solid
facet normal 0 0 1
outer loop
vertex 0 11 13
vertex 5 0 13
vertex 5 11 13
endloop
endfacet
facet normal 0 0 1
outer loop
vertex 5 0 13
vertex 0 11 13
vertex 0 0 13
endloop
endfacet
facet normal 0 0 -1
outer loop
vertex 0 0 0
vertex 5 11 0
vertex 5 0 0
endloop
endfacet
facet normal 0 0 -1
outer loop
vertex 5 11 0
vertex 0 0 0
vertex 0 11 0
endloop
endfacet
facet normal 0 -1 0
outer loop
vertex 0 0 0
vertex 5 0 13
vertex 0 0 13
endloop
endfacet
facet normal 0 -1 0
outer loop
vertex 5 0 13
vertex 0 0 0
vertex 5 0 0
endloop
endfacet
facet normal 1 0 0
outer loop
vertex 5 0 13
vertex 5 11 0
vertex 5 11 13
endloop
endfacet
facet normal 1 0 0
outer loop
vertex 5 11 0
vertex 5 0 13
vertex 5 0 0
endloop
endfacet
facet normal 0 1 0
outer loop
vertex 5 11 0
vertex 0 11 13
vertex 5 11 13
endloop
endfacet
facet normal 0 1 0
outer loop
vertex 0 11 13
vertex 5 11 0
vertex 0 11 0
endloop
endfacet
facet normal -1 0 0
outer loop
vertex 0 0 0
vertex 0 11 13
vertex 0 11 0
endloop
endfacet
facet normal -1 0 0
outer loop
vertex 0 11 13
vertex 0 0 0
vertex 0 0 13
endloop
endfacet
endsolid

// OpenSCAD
// Generated by SolidPython 1.0.1 on 2020-07-29 00:46:54


cube(size = [5, 11, 13]);
/***********************************************
*********      SolidPython code:      **********
************************************************
 
# import packages: SolidPython
from solid import *
from solid.utils import *
from itertools import chain, combinations, permutations


class Resize:

    def __init__(self, scad_file):
        self.scad_file = scad_file
        #self.scad_file = import_scad(scad_file)
        # cone/cylinder param:
        self.r1 = 0
        self.r2 = 0
        self.h = 0
        # rectangular prism param:
        self.w = 0
        self.l = 0
        # ellipse param:
        self.r = 0

    # import OpenScad code (file name corresponds to shape)


    # classify shape + parameters
    def assign(self, param1, param2, param3):
        if self.scad_file == 'cone.scad':
            self.r1 = param1
            self.r2 = param2
            self.h = param3
        elif self.scad_file == 'cylinder.scad':
            self.r1 = param1
            self.r2 = param2
            self.h = param3
        elif self.scad_file == 'rectangularPrism.scad':
            self.h = param1
            self.l = param2
            self.w = param3
        else:
            self.r = param1
            self.h = param2

    # resize parameters
    def iterate(self):
        x = range(3, 20, 2)
        i = 1
        if self.scad_file == 'cone.scad':
            tempList = list(permutations(x, 2))
            for temp in tempList:
                param1 = temp[0]
                param2 = temp[1]
                filepath = 'produced_scad_files/' + 'cone' + str(param1) + '_' + str(param2) + '_' + '.scad'
                scad_render_to_file(cylinder(h=param1, r1=param2, r2=0), filepath)

        elif self.scad_file == 'cylinder.scad':
            tempList = list(permutations(x, 3))
            for temp in tempList:
                param1 = temp[0]
                param2 = temp[1]
                filepath = 'produced_scad_files/' + 'cylinder' + str(param1) + '_' + str(param2) + '_' + '.scad'
                scad_render_to_file(cylinder(h=param1, r1=param2, r2=param2), filepath)

        elif self.scad_file == 'rectangularPrism.scad':
            tempList = list(permutations(x, 3))
            for temp in tempList:
                param1 = temp[0]
                param2 = temp[1]
                param3 = temp[2]
                filepath = 'produced_scad_files/' + 'rectangularPrism' + str(param1) + '_' + str(param2) + '_' + str(
                    param3) + '.scad'
                scad_render_to_file(cube(size=(param1, param2, param3)), filepath)

        elif self.scad_file == 'ellipse.scad':
            tempList = list(permutations(x, 4))
            for temp in tempList:
                param1 = temp[0]
                param2 = temp[1]
                param3 = temp[2]
                param4 = temp[3]
                filepath = 'produced_scad_files/' + 'ellipse' + str(param1) + '_' + str(param2) + '_' + str(param3) + '_' + str(param4) + '.scad'
                scad_render_to_file(scale([param1, param2, param3])(sphere(r=param4)), filepath)

    def render_to_scadfile(self):
        scad_render_to_file(scad, 'example.scad') 
 
************************************************/
